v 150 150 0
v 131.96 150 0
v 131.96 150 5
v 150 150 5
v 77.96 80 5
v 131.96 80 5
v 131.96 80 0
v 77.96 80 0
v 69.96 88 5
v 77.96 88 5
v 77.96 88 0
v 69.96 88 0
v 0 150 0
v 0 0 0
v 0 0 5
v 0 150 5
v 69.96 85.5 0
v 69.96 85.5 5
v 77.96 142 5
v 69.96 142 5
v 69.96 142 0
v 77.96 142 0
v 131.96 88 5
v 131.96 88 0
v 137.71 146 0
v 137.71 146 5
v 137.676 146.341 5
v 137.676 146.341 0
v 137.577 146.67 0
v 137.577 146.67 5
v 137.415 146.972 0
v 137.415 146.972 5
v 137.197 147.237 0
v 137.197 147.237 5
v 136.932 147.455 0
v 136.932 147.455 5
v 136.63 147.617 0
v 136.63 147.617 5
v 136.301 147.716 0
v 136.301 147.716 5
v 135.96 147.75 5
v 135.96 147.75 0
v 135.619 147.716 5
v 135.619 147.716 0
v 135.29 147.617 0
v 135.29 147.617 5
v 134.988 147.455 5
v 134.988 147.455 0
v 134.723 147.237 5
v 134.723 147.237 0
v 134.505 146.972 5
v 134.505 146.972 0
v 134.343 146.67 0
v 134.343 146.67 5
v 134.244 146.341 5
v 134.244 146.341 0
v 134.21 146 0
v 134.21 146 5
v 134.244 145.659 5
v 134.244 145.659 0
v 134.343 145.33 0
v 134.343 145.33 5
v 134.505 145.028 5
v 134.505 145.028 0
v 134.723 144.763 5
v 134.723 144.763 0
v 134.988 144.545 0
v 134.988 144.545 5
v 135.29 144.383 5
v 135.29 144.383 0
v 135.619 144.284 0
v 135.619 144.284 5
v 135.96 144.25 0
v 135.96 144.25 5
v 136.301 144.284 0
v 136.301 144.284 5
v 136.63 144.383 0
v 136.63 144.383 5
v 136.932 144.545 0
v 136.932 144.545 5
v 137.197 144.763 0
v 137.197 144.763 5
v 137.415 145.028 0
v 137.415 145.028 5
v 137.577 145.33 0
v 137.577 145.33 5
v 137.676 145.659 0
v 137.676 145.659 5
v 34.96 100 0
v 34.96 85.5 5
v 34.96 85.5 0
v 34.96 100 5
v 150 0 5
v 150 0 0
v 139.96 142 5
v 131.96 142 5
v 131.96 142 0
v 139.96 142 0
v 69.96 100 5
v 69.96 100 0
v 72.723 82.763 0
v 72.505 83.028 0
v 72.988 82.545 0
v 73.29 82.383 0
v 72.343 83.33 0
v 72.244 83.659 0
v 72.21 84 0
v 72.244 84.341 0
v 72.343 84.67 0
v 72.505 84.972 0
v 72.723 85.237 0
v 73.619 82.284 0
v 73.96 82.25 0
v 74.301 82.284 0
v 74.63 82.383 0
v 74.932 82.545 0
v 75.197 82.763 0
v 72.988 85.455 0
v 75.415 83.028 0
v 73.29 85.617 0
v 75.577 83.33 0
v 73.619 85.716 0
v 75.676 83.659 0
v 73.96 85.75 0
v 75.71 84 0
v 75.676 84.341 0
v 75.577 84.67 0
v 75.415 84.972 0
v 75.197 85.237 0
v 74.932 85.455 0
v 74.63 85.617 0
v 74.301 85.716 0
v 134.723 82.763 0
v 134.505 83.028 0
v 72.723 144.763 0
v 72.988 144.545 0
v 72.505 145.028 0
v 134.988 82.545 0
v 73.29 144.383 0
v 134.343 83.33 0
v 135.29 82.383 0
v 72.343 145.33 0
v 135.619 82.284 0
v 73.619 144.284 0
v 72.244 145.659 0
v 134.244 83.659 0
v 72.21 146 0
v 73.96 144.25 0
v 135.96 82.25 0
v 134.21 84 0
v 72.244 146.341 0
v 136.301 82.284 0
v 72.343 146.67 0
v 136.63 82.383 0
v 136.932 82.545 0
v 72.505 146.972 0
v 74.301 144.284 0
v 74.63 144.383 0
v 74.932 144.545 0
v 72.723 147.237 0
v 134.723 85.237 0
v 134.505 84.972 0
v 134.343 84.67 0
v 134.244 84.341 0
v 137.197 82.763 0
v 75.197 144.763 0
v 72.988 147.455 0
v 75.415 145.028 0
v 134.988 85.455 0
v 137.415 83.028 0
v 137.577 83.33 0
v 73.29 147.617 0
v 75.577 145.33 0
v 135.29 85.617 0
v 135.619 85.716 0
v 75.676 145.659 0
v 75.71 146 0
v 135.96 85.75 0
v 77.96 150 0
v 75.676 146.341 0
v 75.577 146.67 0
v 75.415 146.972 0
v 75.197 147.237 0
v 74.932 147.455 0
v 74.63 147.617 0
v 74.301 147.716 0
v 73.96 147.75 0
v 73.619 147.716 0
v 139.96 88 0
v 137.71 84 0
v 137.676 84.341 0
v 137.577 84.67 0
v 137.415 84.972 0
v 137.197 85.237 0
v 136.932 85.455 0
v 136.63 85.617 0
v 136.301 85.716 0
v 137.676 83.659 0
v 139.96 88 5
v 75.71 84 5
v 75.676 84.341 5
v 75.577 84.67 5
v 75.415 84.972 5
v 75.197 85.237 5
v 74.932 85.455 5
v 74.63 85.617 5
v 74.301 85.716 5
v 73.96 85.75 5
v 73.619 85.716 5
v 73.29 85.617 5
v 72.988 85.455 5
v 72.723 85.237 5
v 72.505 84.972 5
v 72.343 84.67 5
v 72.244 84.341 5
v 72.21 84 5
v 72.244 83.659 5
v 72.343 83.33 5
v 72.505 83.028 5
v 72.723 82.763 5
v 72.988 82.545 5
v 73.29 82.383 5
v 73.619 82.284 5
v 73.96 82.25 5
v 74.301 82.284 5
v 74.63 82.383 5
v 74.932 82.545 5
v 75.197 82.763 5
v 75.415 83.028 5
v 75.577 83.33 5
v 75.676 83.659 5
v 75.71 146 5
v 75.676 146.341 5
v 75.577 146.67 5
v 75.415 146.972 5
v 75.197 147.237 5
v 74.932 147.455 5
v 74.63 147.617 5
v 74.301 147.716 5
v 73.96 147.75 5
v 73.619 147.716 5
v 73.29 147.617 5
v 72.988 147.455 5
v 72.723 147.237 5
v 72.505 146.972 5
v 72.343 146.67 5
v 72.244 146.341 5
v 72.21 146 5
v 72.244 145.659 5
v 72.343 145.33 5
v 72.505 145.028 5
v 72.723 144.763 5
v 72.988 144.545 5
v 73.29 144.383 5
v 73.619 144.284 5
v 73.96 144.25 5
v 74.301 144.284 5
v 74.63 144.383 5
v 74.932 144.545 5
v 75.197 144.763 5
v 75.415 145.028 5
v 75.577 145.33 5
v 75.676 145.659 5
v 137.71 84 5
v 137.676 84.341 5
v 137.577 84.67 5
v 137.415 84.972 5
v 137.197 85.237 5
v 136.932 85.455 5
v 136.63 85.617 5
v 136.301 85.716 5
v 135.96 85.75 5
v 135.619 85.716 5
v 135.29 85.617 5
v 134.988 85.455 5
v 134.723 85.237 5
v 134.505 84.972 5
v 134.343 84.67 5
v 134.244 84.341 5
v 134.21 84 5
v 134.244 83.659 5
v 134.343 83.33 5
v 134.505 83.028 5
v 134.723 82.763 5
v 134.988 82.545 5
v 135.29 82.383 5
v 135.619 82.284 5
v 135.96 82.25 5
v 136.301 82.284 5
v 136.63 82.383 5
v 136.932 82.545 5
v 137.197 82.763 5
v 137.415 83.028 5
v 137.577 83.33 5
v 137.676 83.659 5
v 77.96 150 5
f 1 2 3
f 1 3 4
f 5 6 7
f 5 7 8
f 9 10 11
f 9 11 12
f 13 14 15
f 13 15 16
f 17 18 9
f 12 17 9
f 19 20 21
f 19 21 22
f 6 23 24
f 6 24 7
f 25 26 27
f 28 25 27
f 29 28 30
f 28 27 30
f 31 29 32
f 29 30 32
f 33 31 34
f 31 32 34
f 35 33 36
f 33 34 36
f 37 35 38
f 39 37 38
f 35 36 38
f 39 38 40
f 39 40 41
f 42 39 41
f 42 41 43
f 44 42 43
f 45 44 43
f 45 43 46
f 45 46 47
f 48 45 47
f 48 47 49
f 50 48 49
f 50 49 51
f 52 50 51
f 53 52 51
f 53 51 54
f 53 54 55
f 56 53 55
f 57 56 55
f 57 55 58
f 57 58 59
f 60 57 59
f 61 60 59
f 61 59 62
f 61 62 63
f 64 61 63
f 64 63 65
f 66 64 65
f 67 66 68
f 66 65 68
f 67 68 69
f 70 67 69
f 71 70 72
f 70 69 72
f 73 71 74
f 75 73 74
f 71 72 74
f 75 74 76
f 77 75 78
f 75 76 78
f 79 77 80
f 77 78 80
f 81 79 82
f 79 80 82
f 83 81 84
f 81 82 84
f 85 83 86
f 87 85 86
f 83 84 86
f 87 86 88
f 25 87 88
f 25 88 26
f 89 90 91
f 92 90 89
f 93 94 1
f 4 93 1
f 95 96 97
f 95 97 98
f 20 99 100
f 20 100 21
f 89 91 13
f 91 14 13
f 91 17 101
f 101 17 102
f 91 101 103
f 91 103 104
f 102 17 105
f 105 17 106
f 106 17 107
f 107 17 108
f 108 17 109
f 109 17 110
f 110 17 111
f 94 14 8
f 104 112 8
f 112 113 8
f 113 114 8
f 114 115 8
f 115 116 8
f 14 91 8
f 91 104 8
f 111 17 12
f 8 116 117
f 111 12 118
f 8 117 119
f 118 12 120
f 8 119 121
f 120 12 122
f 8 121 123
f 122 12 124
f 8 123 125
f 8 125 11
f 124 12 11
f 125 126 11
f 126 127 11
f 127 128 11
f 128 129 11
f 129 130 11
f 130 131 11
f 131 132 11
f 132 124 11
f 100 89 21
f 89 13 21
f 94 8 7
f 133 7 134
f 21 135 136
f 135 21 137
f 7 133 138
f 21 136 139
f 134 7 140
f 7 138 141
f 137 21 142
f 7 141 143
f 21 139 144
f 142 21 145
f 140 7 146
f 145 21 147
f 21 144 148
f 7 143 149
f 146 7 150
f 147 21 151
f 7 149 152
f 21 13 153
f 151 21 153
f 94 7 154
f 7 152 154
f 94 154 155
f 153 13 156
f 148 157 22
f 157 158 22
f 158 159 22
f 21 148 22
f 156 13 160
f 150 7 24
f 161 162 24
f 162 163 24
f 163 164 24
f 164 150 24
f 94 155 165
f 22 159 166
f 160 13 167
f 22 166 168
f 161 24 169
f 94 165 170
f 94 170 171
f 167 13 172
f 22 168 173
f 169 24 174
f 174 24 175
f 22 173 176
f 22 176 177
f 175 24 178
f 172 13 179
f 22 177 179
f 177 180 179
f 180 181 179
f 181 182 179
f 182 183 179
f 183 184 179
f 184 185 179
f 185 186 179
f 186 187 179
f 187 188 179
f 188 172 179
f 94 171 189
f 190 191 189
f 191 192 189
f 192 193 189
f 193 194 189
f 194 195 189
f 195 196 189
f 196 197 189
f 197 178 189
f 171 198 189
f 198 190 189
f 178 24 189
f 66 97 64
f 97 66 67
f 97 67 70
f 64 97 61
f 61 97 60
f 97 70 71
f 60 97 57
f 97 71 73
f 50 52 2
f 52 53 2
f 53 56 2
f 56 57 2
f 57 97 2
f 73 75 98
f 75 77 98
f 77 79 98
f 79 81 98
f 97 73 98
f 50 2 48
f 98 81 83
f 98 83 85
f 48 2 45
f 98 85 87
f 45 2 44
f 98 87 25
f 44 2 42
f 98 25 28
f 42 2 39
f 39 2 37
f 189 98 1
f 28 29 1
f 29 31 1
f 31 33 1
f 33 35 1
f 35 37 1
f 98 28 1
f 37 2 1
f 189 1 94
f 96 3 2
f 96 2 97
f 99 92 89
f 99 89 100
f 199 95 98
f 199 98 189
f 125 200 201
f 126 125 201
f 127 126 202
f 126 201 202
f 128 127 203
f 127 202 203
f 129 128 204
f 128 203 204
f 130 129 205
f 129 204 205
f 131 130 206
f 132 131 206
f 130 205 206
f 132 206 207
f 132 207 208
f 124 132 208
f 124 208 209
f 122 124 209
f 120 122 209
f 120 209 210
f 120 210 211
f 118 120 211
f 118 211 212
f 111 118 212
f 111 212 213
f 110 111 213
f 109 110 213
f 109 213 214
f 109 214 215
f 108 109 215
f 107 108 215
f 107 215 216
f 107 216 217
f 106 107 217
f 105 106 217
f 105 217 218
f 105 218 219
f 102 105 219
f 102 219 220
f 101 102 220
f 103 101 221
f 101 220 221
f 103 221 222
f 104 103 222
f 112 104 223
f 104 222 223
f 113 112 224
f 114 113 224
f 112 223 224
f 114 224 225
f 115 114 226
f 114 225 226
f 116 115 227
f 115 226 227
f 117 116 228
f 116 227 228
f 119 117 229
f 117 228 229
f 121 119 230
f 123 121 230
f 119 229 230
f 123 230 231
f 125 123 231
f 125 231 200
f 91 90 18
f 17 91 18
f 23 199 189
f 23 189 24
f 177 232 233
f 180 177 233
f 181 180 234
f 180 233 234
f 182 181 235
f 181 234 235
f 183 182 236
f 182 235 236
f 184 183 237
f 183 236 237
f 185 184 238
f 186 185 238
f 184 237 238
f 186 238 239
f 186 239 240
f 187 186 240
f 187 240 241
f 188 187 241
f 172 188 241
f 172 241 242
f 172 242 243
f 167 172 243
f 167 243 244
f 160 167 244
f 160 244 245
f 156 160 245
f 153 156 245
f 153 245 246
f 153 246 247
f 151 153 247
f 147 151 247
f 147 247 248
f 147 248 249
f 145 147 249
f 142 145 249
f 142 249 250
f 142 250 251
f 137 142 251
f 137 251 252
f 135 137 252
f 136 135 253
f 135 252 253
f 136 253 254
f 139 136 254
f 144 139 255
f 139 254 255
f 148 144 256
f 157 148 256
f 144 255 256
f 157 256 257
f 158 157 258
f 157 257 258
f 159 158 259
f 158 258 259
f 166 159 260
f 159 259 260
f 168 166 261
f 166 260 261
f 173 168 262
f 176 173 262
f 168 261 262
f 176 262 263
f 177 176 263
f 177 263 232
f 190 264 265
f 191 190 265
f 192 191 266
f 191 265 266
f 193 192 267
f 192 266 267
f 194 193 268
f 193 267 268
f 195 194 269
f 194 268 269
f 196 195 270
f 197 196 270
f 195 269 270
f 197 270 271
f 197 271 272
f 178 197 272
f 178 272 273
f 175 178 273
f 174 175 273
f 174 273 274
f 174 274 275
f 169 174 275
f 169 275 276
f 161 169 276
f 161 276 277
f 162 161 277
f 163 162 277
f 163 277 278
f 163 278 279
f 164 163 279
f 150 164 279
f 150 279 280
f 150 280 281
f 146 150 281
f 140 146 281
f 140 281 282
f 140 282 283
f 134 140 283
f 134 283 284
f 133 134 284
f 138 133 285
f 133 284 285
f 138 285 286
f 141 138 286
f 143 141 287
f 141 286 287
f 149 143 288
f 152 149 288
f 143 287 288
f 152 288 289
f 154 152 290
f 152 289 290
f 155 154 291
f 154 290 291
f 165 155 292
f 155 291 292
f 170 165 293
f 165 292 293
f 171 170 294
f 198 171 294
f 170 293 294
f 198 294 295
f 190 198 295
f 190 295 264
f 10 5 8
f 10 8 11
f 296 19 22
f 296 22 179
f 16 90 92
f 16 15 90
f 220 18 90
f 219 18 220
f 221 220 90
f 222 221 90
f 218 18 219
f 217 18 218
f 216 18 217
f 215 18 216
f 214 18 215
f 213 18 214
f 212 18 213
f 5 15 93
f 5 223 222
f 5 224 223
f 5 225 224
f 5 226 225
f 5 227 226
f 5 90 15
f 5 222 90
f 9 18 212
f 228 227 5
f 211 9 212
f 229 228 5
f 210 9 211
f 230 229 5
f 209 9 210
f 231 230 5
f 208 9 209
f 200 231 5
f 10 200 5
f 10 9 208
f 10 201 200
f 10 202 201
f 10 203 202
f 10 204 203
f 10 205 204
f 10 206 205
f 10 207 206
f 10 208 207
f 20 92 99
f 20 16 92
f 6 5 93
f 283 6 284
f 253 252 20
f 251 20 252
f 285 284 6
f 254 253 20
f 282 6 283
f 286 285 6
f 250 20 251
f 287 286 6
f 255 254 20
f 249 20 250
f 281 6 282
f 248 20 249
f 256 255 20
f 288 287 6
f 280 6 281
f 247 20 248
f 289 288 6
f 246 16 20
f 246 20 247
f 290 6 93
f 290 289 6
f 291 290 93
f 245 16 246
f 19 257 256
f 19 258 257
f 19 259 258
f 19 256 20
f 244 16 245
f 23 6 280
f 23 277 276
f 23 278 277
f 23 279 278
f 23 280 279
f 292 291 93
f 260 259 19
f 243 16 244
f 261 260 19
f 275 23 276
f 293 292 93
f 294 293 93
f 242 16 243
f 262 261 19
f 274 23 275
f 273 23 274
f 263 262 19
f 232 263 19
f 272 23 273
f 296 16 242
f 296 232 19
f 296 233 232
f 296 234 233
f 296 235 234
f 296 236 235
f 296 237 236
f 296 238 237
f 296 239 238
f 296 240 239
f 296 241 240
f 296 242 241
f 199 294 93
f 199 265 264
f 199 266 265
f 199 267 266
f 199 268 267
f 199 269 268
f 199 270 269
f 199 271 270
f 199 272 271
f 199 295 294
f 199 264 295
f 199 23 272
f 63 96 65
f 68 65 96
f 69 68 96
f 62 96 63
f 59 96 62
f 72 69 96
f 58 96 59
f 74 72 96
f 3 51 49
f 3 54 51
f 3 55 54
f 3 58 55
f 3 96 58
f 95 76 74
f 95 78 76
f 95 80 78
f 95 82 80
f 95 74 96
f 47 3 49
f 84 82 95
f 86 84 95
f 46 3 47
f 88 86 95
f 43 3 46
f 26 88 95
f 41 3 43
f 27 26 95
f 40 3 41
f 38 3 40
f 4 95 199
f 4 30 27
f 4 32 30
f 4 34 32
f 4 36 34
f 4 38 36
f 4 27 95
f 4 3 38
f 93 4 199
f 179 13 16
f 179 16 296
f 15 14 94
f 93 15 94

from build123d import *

# Parameters (mm, degrees)
SKETCH1_W           = 150
SKETCH1_H           = 150
BOSS_EXTRUDE1_DEPTH = 5
SKETCH2_R           = 1.75
CUT_EXTRUDE1_DEPTH  = 213.190951739
SKETCH3_W           = 35
SKETCH3_H           = 14.5
CUT_EXTRUDE2_DEPTH  = 213.190951739


with BuildPart() as part:
    # Sketch1 → Boss-Extrude1 (new body)
    with BuildSketch(Plane.XY):
        with Locations((75, 75)):
            Rectangle(SKETCH1_W, SKETCH1_H)
    extrude(amount=BOSS_EXTRUDE1_DEPTH)

    # Sketch2 → Cut-Extrude1 (cut, through all)
    with BuildSketch(Plane.XY.offset(5)):
        with Locations((73.960018565, 84)):
            Circle(SKETCH2_R)
        with Locations((73.960018565, 146)):
            Circle(SKETCH2_R)
        with Locations((135.960018565, 146)):
            Circle(SKETCH2_R)
        with Locations((135.960018565, 84)):
            Circle(SKETCH2_R)
        Polygon((77.960018565, 150), (131.960018565, 150), (131.960018565, 142), (139.960018565, 142), (139.960018565, 88), (131.960018565, 88), (131.960018565, 80), (77.960018565, 80), (77.960018565, 88), (69.960018565, 88), (69.960018565, 142), (77.960018565, 142), align=None)
    extrude(amount=-CUT_EXTRUDE1_DEPTH, mode=Mode.SUBTRACT)

    # Sketch3 → Cut-Extrude2 (cut, through all)
    with BuildSketch(Plane.XY.offset(5)):
        with Locations((52.460018565, 92.75)):
            Rectangle(SKETCH3_W, SKETCH3_H)
    extrude(amount=-CUT_EXTRUDE2_DEPTH, mode=Mode.SUBTRACT)


solid = part.part
